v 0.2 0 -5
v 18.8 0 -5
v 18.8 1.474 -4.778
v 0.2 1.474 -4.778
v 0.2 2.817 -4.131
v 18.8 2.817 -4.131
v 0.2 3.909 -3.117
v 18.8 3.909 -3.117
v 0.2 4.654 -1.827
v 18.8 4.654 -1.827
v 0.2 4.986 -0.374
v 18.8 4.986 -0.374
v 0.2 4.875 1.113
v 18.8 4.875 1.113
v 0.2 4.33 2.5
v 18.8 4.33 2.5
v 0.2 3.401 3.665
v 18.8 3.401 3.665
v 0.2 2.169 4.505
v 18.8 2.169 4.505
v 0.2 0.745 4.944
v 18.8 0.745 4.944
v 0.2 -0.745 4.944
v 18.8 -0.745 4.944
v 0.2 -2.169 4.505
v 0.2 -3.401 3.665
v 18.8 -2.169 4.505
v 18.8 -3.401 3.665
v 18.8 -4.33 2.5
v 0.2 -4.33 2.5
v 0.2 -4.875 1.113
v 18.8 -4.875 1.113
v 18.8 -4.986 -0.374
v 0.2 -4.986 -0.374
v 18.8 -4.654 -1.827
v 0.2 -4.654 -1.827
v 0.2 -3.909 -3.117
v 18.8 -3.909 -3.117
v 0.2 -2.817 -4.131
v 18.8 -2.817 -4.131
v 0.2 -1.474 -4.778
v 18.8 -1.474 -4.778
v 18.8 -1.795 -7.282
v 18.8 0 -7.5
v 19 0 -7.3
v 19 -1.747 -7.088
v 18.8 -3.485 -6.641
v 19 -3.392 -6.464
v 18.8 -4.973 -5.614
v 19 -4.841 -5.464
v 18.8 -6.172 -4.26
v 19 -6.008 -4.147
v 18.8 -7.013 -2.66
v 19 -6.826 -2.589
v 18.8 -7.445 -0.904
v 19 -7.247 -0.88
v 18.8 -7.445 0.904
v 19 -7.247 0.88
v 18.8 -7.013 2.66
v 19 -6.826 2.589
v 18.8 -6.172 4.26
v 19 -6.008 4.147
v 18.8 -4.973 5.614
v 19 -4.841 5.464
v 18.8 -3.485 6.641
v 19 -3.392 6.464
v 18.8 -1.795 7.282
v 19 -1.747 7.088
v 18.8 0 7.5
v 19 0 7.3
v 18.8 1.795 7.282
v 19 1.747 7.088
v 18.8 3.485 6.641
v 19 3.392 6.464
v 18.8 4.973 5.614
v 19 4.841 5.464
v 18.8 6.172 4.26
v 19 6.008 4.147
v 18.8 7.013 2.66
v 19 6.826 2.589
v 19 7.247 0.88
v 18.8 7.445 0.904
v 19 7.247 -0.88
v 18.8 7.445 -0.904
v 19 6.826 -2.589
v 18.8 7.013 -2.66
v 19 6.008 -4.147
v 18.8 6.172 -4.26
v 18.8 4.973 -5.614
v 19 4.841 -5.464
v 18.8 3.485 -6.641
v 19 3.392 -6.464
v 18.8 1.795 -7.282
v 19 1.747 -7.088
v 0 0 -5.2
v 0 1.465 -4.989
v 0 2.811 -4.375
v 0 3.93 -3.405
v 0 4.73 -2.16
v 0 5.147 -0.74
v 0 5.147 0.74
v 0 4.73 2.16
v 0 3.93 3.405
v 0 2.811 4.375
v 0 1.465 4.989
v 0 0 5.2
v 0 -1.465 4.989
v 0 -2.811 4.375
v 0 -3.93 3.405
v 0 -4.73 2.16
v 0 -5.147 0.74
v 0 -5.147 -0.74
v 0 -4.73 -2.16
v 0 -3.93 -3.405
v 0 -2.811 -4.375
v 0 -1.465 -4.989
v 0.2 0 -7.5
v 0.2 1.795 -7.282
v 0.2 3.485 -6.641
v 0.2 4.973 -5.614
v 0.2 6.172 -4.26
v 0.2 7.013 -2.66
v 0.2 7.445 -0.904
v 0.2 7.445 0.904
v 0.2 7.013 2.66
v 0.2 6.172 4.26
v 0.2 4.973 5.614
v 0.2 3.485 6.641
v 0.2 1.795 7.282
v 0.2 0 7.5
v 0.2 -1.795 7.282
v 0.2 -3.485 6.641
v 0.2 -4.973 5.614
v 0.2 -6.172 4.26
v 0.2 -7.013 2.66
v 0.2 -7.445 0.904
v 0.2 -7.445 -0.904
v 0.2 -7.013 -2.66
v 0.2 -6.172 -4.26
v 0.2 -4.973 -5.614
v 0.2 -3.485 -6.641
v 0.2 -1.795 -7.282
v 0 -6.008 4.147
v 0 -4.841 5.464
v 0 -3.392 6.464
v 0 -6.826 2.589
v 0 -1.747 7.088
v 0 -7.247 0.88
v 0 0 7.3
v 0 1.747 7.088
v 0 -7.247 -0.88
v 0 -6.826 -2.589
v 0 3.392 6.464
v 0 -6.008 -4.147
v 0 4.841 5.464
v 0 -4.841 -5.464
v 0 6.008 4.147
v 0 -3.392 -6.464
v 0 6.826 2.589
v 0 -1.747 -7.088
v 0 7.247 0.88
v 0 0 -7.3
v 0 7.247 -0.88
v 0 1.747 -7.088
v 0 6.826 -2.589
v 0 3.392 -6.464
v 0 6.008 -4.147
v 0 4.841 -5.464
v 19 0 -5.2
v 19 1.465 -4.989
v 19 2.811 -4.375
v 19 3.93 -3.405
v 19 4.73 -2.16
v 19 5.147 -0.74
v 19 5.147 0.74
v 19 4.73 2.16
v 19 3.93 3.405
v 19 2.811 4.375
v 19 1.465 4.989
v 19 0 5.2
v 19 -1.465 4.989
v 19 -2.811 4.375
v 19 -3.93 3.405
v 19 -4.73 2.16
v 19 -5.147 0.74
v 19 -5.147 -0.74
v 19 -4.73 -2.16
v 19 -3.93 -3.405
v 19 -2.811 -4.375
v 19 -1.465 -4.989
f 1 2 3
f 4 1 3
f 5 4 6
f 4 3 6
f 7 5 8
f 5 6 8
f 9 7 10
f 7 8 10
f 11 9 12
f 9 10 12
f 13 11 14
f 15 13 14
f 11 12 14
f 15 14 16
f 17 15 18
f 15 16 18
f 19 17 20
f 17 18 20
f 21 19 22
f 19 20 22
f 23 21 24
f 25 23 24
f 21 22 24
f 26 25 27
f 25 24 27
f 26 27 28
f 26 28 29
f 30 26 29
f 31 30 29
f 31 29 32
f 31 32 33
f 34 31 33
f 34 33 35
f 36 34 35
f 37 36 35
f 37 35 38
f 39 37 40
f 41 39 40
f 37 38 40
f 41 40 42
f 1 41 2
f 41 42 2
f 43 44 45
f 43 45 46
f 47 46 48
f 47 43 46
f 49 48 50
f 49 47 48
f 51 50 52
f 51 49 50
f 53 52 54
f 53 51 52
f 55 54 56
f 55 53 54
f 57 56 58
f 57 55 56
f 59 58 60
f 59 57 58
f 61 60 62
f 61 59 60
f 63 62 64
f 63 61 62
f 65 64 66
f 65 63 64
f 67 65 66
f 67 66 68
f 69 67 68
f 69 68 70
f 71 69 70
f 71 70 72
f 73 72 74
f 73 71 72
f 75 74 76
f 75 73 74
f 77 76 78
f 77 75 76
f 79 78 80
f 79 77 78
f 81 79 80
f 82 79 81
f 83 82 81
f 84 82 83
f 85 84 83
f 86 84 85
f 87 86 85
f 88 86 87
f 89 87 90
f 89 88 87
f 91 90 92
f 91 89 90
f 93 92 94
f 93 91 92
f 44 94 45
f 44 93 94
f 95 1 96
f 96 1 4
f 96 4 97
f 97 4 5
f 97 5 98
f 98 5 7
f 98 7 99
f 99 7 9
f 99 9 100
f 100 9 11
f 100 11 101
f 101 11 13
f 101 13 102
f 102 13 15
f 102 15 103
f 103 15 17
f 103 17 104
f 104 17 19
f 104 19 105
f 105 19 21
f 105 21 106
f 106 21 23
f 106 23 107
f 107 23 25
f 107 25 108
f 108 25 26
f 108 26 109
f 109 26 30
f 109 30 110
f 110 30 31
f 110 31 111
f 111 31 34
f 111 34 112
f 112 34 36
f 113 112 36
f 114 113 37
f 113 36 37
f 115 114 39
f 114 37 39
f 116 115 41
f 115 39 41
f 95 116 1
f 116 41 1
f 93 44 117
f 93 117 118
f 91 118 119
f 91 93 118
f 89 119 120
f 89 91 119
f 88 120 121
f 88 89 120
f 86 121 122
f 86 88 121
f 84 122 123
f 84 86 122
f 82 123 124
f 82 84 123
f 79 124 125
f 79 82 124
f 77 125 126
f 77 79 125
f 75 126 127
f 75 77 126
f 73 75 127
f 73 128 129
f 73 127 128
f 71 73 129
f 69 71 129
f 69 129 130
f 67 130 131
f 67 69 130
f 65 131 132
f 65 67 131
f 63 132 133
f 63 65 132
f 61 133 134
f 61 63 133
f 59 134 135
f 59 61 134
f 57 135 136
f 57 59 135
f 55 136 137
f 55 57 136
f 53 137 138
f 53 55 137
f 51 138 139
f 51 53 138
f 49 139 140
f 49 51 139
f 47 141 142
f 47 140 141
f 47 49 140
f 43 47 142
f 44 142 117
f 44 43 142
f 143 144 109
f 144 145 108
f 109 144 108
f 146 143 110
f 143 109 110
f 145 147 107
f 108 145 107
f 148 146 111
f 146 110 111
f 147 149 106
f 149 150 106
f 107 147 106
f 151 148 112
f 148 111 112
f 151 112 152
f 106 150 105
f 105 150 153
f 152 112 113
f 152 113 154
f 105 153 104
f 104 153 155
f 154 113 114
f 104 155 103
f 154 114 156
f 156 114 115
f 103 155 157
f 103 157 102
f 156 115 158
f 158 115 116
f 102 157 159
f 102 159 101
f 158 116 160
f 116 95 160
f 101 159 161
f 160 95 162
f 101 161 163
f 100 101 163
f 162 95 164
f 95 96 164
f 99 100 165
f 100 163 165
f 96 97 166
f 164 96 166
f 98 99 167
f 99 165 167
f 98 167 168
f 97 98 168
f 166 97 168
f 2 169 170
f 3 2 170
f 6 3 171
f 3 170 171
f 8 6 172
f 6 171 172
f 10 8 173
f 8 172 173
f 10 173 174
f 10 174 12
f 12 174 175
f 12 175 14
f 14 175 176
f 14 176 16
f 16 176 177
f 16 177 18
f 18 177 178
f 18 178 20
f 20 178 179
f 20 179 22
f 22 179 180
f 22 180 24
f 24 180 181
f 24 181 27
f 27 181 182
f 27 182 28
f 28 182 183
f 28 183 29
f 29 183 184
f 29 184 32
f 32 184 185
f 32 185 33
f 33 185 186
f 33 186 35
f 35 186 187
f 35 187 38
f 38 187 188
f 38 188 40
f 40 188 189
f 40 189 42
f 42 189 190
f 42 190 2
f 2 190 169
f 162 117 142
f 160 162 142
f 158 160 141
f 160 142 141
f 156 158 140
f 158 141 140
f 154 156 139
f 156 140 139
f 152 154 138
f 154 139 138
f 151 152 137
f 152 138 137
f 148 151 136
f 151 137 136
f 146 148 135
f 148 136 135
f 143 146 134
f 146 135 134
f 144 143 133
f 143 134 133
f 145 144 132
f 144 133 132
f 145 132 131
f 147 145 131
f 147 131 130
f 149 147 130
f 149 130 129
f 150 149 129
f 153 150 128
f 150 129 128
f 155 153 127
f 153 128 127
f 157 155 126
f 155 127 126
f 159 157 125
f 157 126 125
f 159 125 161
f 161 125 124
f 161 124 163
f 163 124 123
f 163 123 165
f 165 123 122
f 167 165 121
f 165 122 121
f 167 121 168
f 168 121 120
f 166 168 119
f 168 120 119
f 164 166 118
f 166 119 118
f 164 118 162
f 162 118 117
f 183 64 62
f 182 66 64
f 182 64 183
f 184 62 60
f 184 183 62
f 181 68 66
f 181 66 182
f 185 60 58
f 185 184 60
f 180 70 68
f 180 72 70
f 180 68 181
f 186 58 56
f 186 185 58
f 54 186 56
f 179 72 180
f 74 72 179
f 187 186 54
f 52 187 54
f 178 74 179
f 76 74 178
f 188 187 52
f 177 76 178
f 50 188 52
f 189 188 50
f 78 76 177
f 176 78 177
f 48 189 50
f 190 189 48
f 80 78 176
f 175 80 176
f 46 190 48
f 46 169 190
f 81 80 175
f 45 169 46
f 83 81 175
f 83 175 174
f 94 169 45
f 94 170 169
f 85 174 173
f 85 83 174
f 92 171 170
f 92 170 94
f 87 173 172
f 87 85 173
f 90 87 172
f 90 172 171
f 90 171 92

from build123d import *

# Parameters (mm, degrees)
SKIZZE2_W  = 19
SKIZZE2_H  = 2.5
FASE1_SIZE = 0.2


with BuildPart() as part:
    # Skizze2 → Rotation1 (revolve)
    with BuildSketch(Plane(origin=(0, 0, 0), x_dir=(1, 0, 0), z_dir=(0, 1, 0)), mode=Mode.PRIVATE) as rotation1_sk:
        with Locations((9.5, 6.25)):
            Rectangle(SKIZZE2_W, SKIZZE2_H)
        with Locations((9.5, -6.25)):
            Rectangle(SKIZZE2_W, SKIZZE2_H)
    revolve(rotation1_sk.sketch.rotate(Axis((0, 0, 0), (1, 0, 0)), 180), axis=Axis((0, 0, 0), (1, 0, 0)))

    # Fase1
    fase1_edges = [part.edges().sort_by_distance(p)[0] for p in [
        (0, 0, -5),
        (19, 0, -5),
        (19, 0, -7.5),
        (0, 0, -7.5),
    ]]
    chamfer(fase1_edges, length=FASE1_SIZE)


solid = part.part
